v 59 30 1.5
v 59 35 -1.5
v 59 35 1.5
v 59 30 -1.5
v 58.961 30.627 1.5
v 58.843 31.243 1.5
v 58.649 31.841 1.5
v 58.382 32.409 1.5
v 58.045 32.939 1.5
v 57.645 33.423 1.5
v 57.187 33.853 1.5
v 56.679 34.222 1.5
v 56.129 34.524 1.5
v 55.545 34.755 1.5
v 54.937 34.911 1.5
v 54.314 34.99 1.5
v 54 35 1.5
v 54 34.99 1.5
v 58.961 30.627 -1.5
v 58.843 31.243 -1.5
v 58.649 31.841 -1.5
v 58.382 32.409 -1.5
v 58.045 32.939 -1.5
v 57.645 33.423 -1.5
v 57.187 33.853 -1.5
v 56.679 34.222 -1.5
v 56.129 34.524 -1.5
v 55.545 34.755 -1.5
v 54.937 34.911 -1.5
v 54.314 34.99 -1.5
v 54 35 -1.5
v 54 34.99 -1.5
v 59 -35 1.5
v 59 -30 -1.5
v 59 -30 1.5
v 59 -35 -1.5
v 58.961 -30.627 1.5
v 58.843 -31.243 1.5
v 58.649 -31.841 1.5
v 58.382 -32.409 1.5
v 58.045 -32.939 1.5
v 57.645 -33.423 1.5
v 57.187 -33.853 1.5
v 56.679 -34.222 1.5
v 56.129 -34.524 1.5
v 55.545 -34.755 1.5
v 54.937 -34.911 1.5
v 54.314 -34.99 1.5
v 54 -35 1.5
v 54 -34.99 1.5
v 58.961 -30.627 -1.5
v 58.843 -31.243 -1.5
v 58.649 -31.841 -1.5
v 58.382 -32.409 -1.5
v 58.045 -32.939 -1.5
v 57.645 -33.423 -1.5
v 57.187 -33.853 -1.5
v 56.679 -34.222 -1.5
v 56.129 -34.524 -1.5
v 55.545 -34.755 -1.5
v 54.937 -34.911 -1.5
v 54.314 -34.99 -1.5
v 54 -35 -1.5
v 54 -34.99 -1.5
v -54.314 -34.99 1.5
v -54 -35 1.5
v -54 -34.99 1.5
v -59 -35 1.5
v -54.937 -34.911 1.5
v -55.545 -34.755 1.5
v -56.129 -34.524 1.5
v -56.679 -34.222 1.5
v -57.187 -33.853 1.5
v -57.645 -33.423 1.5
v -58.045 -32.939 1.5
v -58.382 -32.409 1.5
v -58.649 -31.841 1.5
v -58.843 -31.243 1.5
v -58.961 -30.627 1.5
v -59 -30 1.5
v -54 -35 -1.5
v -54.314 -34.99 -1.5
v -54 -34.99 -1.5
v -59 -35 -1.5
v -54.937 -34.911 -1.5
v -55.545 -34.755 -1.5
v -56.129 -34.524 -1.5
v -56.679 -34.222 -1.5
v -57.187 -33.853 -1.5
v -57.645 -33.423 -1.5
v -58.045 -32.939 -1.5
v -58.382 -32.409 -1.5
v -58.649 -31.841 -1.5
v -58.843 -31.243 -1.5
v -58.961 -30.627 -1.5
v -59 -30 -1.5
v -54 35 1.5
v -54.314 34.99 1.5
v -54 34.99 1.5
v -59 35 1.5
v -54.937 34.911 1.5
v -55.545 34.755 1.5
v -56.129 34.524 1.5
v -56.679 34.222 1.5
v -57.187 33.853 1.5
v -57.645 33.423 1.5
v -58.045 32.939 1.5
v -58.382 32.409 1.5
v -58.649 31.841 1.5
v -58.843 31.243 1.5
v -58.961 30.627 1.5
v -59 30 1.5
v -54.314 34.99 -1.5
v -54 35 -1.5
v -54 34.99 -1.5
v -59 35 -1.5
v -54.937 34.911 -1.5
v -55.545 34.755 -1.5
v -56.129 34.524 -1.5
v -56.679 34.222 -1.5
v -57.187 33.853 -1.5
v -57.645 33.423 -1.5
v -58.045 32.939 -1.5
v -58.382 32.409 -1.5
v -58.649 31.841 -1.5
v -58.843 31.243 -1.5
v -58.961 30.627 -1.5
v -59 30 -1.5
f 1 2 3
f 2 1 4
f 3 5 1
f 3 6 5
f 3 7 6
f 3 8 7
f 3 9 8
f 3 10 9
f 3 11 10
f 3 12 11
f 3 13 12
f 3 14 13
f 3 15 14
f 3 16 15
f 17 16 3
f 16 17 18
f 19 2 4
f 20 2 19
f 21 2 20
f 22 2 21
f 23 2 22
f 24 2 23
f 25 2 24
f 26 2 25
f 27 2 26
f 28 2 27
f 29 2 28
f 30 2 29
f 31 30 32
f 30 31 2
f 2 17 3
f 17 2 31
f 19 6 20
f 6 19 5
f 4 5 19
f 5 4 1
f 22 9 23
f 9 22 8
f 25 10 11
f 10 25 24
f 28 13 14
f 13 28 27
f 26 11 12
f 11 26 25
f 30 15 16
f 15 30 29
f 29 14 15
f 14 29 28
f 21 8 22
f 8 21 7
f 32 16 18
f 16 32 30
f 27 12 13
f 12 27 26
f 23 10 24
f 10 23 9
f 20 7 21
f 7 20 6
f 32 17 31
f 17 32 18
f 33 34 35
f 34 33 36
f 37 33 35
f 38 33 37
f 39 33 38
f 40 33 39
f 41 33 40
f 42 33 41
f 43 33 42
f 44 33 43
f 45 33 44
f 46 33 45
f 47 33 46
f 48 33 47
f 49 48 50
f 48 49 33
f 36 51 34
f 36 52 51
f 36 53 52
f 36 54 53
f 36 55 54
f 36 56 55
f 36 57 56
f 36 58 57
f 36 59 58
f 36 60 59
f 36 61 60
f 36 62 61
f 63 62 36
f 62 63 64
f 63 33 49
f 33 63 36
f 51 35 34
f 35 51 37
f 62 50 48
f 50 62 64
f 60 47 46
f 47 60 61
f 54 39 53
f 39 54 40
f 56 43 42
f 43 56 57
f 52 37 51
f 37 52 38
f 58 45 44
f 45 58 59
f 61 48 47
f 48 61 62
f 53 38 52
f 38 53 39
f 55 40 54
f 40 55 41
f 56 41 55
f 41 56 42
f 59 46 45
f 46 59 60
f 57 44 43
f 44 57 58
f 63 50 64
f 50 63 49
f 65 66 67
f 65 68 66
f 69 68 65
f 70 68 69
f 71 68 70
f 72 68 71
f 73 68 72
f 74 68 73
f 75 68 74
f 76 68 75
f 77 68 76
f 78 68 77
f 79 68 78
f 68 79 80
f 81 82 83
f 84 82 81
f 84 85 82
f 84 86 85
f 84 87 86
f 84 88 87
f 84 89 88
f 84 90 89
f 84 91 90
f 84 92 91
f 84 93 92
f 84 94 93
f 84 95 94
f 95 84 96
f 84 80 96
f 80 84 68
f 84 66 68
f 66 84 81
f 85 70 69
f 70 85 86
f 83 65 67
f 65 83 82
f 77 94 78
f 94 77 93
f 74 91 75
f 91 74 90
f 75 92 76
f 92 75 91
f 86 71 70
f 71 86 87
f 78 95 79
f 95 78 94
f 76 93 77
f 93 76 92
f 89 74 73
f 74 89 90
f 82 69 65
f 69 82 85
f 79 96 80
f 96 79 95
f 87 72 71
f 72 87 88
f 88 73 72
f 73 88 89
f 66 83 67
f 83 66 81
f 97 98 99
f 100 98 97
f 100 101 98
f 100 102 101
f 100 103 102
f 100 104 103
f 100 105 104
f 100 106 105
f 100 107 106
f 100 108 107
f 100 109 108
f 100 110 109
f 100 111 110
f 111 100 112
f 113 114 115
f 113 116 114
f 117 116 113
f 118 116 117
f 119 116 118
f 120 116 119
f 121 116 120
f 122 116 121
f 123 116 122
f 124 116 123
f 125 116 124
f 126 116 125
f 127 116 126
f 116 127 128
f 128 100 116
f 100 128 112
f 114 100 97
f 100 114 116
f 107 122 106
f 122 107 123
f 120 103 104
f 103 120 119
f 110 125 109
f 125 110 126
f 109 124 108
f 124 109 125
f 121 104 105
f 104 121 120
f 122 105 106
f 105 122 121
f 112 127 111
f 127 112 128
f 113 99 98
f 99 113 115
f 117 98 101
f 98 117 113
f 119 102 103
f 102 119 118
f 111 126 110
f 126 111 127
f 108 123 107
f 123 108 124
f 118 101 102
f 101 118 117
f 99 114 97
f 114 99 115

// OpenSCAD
// file: chamfered_corner.scad
$fn = 50;

// chamferred corners
// -- this gives you the part to SUBTRACT for a chamferred corner

module chamfered_corner(xlate_x, xlate_y, xlate_z, corner, rad, thickness) {
    echo ("chamfer quad:", corner[0], corner[1]);
    echo ("chamfer translate:", xlate_x, xlate_y, xlate_z);
    
    translate([corner[0] * xlate_x, corner[1] * xlate_y, xlate_z])
    {
        
            // intersection == to get just one corner
            intersection() {
            translate([corner[0]*rad/2, corner[1]*rad/2, 0])
            cube([rad, rad, thickness], center=true);
            // cube w/ center circle removed == 4 corners
            difference() {
                cube ([rad * 2, rad * 2, thickness], center=true);
                cylinder(h = thickness, r = rad, center = true);
                }
            }   
        
    }
}
// main file
include <chamfered_corner.scad>;


mount_height = 118;
mount_width = 70;
mount_thickness = 3;

rad = 5;

// chamferred corners
chamfered_corner(mount_height/2 - rad, mount_width/2 - rad, 0, [1,1], rad, mount_thickness);

chamfered_corner((mount_height/2 - rad), (mount_width/2 - rad), 0, [ 1,-1], rad, mount_thickness);

chamfered_corner((mount_height/2 - rad), (mount_width/2 - rad), 0, [-1,-1], rad, mount_thickness);

chamfered_corner((mount_height/2 - rad), (mount_width/2 - rad), 0, [-1, 1], rad, mount_thickness);
